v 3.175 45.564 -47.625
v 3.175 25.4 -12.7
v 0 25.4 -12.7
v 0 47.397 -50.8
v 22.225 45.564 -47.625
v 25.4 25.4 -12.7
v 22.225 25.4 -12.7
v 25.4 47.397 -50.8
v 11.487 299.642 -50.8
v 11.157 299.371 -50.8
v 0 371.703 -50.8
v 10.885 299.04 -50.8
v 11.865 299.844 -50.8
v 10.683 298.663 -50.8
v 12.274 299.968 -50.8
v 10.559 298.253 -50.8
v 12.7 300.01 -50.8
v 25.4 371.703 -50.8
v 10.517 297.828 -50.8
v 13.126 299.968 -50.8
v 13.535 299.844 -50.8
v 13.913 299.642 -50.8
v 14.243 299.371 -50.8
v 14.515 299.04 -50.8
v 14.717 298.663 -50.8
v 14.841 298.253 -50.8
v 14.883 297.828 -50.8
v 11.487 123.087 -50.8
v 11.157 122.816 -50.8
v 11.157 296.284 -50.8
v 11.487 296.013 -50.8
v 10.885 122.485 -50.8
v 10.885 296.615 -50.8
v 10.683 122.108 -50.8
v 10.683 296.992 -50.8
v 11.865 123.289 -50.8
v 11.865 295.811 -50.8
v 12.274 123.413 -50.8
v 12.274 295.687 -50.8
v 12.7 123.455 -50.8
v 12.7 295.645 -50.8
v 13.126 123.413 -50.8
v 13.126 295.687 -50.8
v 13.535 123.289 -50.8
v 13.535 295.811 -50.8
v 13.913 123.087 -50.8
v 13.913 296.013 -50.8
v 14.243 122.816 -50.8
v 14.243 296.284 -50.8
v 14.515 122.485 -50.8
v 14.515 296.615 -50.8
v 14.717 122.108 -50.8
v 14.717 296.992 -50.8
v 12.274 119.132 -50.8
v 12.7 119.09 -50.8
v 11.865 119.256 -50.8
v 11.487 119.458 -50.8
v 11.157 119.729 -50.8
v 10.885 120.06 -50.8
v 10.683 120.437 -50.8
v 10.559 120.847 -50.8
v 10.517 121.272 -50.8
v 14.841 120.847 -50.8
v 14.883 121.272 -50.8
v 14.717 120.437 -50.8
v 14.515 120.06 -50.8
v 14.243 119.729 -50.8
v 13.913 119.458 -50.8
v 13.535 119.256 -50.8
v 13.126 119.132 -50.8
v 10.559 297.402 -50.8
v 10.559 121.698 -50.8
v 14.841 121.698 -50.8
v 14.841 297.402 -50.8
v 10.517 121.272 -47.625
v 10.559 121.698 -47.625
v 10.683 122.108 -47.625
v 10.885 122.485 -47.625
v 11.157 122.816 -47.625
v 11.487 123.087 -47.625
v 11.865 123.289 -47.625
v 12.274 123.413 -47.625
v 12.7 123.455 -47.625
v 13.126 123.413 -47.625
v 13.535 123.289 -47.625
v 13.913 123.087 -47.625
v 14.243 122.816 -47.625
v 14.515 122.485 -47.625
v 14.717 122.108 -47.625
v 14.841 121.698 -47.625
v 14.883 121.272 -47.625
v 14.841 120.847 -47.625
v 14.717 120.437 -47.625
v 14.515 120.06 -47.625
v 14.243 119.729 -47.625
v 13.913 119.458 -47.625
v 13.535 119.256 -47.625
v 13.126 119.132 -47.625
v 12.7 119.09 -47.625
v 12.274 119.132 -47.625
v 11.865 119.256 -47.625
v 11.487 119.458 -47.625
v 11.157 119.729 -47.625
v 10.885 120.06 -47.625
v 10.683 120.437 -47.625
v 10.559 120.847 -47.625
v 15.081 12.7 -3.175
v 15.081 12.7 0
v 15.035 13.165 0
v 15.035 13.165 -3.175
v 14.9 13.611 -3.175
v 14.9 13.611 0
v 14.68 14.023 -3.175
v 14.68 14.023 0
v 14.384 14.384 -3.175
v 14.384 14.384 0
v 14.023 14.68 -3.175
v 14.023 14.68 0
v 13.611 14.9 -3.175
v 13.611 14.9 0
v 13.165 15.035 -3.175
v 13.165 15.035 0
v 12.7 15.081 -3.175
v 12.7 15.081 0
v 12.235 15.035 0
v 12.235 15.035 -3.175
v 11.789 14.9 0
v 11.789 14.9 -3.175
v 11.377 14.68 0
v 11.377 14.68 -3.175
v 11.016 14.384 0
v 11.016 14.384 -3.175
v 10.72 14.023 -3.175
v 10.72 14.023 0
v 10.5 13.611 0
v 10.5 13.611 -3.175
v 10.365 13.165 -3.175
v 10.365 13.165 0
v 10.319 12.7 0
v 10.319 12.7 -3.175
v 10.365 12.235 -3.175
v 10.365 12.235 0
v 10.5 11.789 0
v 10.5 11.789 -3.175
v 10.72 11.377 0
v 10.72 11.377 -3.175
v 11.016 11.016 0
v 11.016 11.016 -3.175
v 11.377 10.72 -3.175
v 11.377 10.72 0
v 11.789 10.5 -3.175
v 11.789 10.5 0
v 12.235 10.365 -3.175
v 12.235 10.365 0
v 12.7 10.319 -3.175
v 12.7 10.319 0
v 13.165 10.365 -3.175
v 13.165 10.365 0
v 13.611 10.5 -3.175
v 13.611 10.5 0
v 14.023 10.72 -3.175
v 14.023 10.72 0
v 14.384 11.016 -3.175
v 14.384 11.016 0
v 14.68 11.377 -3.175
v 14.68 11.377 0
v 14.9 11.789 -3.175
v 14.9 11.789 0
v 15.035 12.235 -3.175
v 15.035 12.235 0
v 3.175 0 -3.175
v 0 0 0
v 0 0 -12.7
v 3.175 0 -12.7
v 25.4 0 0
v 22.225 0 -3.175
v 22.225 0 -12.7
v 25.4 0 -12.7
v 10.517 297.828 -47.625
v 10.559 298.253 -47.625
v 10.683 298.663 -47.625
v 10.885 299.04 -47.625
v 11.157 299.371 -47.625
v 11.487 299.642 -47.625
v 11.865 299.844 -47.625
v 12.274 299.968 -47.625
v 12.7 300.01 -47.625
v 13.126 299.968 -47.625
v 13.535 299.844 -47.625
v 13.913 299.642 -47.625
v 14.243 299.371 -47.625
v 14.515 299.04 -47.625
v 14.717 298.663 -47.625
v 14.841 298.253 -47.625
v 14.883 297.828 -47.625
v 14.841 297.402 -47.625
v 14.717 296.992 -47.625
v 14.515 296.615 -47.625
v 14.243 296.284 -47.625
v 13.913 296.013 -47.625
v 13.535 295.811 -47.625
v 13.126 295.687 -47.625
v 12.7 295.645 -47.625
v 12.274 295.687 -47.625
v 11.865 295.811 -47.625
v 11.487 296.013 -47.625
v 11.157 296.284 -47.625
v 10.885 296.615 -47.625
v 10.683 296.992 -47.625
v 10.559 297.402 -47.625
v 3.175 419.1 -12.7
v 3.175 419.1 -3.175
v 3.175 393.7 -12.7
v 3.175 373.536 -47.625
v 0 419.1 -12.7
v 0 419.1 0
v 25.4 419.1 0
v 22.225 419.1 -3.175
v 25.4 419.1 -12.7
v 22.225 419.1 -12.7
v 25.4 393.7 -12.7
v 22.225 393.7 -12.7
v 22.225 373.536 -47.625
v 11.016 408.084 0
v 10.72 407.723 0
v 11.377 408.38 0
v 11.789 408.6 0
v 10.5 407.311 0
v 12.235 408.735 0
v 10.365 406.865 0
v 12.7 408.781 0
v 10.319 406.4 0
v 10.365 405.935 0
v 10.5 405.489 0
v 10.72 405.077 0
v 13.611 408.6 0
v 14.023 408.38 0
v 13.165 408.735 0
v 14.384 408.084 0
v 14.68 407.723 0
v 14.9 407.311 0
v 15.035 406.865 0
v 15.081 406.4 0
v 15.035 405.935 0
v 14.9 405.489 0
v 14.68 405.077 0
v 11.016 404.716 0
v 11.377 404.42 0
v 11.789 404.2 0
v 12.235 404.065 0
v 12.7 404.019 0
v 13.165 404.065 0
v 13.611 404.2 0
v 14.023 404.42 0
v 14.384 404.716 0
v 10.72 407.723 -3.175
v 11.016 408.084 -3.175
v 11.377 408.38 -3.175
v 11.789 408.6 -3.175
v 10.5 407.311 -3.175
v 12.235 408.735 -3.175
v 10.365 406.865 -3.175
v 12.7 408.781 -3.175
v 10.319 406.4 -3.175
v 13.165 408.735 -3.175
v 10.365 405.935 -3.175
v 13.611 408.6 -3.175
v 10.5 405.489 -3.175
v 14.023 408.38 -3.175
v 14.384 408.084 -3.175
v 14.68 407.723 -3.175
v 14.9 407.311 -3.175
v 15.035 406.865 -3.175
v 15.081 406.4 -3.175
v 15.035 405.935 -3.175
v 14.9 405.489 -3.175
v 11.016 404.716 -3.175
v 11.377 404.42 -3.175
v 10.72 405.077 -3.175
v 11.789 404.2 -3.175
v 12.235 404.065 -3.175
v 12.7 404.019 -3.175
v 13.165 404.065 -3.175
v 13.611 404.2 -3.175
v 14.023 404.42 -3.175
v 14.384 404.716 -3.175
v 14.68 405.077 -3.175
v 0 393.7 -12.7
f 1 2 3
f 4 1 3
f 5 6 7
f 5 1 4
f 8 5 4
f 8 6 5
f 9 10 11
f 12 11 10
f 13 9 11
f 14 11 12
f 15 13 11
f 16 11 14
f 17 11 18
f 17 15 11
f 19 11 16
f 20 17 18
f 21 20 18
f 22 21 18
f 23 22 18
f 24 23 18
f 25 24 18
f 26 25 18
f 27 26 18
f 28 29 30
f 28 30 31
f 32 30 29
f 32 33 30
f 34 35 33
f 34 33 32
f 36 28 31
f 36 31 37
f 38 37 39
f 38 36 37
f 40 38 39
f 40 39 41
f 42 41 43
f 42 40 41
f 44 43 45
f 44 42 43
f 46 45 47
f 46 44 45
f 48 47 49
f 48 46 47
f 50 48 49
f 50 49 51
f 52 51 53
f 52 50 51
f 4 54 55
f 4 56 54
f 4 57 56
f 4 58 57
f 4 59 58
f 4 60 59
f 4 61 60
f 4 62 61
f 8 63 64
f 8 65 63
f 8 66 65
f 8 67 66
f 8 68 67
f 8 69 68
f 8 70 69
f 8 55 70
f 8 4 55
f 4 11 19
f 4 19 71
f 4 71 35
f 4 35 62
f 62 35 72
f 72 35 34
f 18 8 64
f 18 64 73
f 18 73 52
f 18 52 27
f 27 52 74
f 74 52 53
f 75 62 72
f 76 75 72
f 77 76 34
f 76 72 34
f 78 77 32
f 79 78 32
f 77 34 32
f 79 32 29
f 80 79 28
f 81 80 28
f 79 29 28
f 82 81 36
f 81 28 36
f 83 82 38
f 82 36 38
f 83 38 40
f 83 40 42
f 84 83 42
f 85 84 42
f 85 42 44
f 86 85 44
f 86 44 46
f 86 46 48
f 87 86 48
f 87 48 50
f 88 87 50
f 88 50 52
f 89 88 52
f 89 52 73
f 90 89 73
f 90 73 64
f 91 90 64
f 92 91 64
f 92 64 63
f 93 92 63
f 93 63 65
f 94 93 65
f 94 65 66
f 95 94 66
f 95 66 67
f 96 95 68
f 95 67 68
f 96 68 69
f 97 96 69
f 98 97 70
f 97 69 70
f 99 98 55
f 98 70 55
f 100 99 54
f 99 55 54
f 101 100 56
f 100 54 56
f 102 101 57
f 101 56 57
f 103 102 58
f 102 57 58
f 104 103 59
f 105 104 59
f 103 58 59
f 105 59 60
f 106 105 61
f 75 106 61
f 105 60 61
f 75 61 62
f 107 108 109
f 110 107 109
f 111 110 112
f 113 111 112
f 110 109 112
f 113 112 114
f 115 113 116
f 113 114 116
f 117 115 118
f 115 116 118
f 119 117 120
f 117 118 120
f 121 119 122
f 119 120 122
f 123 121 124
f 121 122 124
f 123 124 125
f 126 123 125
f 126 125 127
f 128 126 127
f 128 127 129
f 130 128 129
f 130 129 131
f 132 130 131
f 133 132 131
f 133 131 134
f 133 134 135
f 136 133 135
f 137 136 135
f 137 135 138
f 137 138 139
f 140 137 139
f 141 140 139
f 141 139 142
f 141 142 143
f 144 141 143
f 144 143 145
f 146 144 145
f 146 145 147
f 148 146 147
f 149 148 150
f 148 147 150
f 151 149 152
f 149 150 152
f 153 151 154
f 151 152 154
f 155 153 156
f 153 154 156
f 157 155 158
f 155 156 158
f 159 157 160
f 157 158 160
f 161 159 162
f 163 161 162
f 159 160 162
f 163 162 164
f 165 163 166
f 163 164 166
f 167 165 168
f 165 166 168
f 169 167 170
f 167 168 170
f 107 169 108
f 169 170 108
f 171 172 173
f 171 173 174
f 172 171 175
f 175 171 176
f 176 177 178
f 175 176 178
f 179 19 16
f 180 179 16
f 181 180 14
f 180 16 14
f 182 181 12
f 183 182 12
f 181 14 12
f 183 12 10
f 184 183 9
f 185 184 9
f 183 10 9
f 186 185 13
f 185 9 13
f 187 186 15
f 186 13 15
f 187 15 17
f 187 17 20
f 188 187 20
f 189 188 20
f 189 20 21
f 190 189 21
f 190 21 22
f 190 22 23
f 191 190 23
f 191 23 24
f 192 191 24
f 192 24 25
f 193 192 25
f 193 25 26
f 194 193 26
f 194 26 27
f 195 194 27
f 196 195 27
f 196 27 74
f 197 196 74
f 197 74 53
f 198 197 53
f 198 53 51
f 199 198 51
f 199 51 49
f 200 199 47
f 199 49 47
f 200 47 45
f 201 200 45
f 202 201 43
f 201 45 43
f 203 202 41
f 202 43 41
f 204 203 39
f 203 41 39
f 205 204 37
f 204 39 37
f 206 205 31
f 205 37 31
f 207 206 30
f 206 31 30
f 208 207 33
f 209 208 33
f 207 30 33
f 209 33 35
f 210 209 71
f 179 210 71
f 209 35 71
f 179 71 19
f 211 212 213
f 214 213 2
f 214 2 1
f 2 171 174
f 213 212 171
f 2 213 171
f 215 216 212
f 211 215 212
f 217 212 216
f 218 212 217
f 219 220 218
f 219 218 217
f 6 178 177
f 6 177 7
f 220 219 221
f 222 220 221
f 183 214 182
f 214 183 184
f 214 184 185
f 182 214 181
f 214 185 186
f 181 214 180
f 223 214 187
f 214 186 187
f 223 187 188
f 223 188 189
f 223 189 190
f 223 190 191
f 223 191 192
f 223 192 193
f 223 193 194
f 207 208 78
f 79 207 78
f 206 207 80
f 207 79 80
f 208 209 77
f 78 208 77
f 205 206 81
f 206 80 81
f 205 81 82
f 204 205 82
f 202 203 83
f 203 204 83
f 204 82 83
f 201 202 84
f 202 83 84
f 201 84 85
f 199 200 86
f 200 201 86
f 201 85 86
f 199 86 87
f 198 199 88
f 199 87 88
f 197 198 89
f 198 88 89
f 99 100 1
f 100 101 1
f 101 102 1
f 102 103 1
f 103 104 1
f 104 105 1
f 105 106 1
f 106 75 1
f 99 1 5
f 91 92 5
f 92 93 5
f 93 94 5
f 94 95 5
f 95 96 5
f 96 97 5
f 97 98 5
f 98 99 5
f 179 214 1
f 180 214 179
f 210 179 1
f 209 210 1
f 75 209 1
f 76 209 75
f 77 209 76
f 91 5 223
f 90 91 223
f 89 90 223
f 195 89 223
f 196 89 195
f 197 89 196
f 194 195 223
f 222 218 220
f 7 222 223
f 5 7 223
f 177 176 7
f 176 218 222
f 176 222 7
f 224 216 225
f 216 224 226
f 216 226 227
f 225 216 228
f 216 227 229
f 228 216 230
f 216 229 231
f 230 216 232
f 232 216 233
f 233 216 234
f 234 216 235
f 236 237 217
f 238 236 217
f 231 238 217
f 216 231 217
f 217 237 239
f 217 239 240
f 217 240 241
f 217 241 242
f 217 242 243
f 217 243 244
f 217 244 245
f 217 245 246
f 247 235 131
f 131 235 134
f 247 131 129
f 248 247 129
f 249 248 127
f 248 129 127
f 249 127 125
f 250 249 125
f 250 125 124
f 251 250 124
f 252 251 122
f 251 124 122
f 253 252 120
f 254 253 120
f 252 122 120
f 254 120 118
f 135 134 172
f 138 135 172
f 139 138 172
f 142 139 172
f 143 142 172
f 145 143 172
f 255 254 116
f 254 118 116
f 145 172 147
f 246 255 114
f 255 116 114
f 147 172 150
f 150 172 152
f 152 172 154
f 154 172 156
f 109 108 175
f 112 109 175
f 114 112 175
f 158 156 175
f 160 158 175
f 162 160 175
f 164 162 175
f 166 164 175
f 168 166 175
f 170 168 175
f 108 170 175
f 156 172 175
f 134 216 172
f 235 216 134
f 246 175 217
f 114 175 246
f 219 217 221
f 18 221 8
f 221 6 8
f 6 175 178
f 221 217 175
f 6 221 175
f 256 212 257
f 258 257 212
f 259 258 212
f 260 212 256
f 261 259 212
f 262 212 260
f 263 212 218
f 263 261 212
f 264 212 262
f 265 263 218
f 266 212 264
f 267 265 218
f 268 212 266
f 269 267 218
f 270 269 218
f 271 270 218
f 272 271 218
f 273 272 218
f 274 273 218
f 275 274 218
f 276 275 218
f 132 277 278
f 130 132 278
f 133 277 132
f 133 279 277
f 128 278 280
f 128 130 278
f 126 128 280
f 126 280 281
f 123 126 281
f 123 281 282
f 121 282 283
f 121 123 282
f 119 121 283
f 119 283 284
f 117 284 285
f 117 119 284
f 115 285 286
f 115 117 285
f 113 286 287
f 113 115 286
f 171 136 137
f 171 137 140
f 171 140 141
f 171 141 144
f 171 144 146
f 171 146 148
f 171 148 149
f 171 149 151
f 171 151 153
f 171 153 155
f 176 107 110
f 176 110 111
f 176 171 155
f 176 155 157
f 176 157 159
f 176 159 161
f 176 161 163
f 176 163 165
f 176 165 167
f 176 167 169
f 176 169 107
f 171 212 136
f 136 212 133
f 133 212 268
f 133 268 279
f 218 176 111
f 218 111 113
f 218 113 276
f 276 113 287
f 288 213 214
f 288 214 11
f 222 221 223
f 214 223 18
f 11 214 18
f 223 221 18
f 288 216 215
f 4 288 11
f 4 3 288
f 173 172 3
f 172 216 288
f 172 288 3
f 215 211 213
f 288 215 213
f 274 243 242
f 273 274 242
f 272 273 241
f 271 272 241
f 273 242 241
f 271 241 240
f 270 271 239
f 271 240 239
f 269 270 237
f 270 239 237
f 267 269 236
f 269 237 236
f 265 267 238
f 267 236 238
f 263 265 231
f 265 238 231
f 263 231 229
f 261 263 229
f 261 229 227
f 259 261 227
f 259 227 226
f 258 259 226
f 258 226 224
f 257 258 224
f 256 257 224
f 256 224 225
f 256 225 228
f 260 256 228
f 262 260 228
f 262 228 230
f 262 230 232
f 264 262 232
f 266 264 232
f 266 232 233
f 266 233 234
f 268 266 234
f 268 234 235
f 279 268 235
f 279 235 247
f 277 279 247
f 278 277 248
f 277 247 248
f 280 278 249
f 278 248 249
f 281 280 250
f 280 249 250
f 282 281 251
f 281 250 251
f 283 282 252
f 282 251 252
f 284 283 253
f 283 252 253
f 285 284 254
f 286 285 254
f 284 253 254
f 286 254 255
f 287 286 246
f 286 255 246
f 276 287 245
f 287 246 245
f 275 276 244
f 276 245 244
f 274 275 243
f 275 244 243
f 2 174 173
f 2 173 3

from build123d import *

# Parameters (mm, degrees)
SKETCH1_W              = 25.4
SKETCH1_H              = 50.8
SKETCH1_W_2            = 19.05
SKETCH1_H_2            = 44.45
BOSS_EXTRUDE1_DEPTH    = 419.1
F_10_CLEARANCE_HOLE1_D = 4.7625
CUT_EXTRUDE1_DEPTH     = 423.930975456
CUT_EXTRUDE2_REACH     = 424.931
SKETCH6_R              = 2.1828125


with BuildPart() as part:
    # Sketch1 → Boss-Extrude1 (new body)
    with BuildSketch(Plane(origin=(0, 0, 0), x_dir=(1, 0, 0), z_dir=(0, 1, 0))):
        with Locations((12.7, 25.4)):
            Rectangle(SKETCH1_W, SKETCH1_H)
        with Locations((12.7, 25.4)):
            Rectangle(SKETCH1_W_2, SKETCH1_H_2, mode=Mode.SUBTRACT)
    extrude(amount=BOSS_EXTRUDE1_DEPTH)

    # #10 Clearance Hole1 (through all)
    with Locations(Plane(origin=(0, 0, -50.8), x_dir=(-1, 0, 0), z_dir=(0, 0, -1))):
        with Locations((-12.7, 406.4), (-12.7, 12.7)):
            Hole(F_10_CLEARANCE_HOLE1_D / 2)

    # Sketch5 → Cut-Extrude1 (cut, through all)
    with BuildSketch(Plane(origin=(25.4, 0, 0), x_dir=(0, 0, -1), z_dir=(1, 0, 0))):
        Polygon((12.7, 419.1), (12.7, 393.7), (50.8, 371.702954744), (50.8, 419.1), align=None)
    cut_extrude1 = extrude(amount=-CUT_EXTRUDE1_DEPTH, mode=Mode.SUBTRACT)

    # Mirror1: Cut-Extrude1 across plane
    add(cut_extrude1.mirror(Plane.ZX.offset(209.55)), mode=Mode.SUBTRACT)

    # Sketch6 → Cut-Extrude2 (cut, up to next)
    with BuildSketch(Plane(origin=(0, 0, -50.8), x_dir=(-1, 0, 0), z_dir=(0, 0, -1)), mode=Mode.PRIVATE) as cut_extrude2_sk1:
        with Locations((-12.7, 121.2725)):
            Circle(SKETCH6_R)
    cut_extrude2_tool1 = extrude(cut_extrude2_sk1.sketch, amount=-CUT_EXTRUDE2_REACH, mode=Mode.PRIVATE) & part.part
    # Sketch6 → Cut-Extrude2 (cut, up to next)
    with BuildSketch(Plane(origin=(0, 0, -50.8), x_dir=(-1, 0, 0), z_dir=(0, 0, -1)), mode=Mode.PRIVATE) as cut_extrude2_sk2:
        with Locations((-12.7, 297.8275)):
            Circle(SKETCH6_R)
    cut_extrude2_tool2 = extrude(cut_extrude2_sk2.sketch, amount=-CUT_EXTRUDE2_REACH, mode=Mode.PRIVATE) & part.part
    add(cut_extrude2_tool1.solids().sort_by_distance((12.7, 121.2725, -50.8))[0], mode=Mode.SUBTRACT)
    add(cut_extrude2_tool2.solids().sort_by_distance((12.7, 297.8275, -50.8))[0], mode=Mode.SUBTRACT)


solid = part.part
